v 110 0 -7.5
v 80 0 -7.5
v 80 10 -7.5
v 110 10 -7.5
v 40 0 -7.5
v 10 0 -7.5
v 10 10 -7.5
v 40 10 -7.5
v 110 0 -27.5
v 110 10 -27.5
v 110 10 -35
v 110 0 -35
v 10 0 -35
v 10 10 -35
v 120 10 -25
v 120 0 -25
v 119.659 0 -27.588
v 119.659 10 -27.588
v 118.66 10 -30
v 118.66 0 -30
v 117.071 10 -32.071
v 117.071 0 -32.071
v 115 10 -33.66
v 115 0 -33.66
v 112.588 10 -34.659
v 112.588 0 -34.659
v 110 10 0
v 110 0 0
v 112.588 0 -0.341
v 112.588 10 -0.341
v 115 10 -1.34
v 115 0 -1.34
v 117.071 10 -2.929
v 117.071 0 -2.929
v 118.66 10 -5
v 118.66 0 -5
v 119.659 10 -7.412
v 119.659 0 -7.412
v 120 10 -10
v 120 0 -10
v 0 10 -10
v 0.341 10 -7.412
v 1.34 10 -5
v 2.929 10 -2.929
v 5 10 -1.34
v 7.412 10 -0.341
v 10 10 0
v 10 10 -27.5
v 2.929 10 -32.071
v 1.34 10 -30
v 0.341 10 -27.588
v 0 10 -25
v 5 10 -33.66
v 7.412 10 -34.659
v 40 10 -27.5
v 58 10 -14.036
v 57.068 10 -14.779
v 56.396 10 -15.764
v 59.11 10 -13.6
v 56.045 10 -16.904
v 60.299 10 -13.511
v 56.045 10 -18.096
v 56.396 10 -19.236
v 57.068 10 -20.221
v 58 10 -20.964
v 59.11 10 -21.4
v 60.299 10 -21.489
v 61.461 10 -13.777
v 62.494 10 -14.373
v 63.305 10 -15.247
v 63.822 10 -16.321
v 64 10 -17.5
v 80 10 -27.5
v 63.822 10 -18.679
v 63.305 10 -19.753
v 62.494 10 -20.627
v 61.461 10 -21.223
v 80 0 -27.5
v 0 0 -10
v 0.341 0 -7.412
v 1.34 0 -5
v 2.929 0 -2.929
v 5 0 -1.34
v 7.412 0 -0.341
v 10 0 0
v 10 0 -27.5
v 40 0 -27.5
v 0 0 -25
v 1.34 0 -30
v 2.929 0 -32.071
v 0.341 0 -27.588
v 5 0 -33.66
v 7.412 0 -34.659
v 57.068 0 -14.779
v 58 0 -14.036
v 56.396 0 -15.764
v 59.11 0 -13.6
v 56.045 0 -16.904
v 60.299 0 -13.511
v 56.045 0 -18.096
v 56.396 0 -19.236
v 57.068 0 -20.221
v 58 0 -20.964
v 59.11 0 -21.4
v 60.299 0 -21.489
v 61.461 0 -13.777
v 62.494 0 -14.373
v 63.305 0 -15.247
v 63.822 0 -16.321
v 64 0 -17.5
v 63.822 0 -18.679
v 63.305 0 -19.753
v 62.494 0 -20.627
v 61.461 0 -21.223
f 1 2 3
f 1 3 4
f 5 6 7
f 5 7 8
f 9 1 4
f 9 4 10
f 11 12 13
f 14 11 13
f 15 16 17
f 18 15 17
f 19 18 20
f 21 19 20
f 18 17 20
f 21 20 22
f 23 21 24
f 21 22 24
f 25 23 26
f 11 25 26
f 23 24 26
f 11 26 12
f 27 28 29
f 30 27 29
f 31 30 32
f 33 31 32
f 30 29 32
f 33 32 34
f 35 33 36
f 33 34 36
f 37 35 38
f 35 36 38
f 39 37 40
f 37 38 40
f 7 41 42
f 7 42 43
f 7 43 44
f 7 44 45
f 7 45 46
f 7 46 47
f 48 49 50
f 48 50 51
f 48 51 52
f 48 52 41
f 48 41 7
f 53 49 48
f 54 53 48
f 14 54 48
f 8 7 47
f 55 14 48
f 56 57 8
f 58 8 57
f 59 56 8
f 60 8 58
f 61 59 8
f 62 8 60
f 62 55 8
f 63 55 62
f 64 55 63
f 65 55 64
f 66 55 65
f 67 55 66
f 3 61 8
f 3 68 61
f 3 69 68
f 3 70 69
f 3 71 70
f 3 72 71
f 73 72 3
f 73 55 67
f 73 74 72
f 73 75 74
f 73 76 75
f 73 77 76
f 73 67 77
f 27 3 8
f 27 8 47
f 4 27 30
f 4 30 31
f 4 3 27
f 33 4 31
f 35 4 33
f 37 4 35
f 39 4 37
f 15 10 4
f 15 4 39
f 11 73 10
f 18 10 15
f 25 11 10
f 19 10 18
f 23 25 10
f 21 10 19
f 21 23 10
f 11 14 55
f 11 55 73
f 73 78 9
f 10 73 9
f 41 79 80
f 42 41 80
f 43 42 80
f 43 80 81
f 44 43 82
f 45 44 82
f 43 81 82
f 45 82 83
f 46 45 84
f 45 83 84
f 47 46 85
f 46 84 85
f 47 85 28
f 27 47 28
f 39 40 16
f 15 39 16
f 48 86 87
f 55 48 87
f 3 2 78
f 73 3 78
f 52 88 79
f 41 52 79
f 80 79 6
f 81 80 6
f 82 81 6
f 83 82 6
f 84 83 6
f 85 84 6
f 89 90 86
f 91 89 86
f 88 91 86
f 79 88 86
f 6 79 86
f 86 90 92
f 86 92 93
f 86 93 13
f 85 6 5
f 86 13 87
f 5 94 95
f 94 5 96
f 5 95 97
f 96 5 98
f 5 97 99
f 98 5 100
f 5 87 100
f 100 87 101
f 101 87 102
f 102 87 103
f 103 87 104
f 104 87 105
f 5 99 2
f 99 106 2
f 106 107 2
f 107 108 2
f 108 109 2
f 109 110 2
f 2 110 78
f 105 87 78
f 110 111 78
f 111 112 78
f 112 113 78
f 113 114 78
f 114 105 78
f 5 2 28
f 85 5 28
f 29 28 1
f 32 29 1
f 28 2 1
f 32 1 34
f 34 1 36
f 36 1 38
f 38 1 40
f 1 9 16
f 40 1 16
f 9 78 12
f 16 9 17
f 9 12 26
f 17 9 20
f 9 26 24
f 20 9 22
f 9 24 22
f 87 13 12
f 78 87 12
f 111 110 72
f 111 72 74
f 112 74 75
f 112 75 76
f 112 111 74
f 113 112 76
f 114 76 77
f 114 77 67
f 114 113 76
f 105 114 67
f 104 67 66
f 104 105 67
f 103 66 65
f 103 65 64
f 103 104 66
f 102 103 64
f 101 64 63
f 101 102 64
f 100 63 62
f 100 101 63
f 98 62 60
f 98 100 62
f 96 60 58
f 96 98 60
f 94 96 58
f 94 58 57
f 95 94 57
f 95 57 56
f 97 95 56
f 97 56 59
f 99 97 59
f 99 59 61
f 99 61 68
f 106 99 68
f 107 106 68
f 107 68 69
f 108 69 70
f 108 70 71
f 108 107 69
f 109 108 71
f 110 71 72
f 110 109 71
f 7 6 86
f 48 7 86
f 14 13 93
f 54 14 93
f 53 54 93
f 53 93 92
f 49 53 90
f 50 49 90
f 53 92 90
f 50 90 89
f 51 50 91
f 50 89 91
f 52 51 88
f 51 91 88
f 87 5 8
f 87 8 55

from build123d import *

# Parameters (mm, degrees)
SKETCH1_R           = 4
SKETCH1_W           = 30
SKETCH1_H           = 20
BOSS_EXTRUDE1_DEPTH = 10


with BuildPart() as part:
    # Sketch1 → Boss-Extrude1 (new body)
    with BuildSketch(Plane(origin=(0, 0, 0), x_dir=(1, 0, 0), z_dir=(0, 1, 0))):
        with BuildLine():
            Line((10, 0), (110, 0))
            ThreePointArc((110, 0), (117.071067812, 2.928932188), (120, 10))
            Line((120, 10), (120, 25))
            ThreePointArc((120, 25), (117.071067812, 32.071067812), (110, 35))
            Line((110, 35), (10, 35))
            ThreePointArc((10, 35), (2.928932188, 32.071067812), (0, 25))
            Line((0, 25), (0, 10))
            ThreePointArc((0, 10), (2.928932188, 2.928932188), (10, 0))
        make_face()
        with Locations((60, 17.5)):
            Circle(SKETCH1_R, mode=Mode.SUBTRACT)
        with Locations((25, 17.5)):
            Rectangle(SKETCH1_W, SKETCH1_H, mode=Mode.SUBTRACT)
        with Locations((95, 17.5)):
            Rectangle(SKETCH1_W, SKETCH1_H, mode=Mode.SUBTRACT)
    extrude(amount=BOSS_EXTRUDE1_DEPTH)


solid = part.part
